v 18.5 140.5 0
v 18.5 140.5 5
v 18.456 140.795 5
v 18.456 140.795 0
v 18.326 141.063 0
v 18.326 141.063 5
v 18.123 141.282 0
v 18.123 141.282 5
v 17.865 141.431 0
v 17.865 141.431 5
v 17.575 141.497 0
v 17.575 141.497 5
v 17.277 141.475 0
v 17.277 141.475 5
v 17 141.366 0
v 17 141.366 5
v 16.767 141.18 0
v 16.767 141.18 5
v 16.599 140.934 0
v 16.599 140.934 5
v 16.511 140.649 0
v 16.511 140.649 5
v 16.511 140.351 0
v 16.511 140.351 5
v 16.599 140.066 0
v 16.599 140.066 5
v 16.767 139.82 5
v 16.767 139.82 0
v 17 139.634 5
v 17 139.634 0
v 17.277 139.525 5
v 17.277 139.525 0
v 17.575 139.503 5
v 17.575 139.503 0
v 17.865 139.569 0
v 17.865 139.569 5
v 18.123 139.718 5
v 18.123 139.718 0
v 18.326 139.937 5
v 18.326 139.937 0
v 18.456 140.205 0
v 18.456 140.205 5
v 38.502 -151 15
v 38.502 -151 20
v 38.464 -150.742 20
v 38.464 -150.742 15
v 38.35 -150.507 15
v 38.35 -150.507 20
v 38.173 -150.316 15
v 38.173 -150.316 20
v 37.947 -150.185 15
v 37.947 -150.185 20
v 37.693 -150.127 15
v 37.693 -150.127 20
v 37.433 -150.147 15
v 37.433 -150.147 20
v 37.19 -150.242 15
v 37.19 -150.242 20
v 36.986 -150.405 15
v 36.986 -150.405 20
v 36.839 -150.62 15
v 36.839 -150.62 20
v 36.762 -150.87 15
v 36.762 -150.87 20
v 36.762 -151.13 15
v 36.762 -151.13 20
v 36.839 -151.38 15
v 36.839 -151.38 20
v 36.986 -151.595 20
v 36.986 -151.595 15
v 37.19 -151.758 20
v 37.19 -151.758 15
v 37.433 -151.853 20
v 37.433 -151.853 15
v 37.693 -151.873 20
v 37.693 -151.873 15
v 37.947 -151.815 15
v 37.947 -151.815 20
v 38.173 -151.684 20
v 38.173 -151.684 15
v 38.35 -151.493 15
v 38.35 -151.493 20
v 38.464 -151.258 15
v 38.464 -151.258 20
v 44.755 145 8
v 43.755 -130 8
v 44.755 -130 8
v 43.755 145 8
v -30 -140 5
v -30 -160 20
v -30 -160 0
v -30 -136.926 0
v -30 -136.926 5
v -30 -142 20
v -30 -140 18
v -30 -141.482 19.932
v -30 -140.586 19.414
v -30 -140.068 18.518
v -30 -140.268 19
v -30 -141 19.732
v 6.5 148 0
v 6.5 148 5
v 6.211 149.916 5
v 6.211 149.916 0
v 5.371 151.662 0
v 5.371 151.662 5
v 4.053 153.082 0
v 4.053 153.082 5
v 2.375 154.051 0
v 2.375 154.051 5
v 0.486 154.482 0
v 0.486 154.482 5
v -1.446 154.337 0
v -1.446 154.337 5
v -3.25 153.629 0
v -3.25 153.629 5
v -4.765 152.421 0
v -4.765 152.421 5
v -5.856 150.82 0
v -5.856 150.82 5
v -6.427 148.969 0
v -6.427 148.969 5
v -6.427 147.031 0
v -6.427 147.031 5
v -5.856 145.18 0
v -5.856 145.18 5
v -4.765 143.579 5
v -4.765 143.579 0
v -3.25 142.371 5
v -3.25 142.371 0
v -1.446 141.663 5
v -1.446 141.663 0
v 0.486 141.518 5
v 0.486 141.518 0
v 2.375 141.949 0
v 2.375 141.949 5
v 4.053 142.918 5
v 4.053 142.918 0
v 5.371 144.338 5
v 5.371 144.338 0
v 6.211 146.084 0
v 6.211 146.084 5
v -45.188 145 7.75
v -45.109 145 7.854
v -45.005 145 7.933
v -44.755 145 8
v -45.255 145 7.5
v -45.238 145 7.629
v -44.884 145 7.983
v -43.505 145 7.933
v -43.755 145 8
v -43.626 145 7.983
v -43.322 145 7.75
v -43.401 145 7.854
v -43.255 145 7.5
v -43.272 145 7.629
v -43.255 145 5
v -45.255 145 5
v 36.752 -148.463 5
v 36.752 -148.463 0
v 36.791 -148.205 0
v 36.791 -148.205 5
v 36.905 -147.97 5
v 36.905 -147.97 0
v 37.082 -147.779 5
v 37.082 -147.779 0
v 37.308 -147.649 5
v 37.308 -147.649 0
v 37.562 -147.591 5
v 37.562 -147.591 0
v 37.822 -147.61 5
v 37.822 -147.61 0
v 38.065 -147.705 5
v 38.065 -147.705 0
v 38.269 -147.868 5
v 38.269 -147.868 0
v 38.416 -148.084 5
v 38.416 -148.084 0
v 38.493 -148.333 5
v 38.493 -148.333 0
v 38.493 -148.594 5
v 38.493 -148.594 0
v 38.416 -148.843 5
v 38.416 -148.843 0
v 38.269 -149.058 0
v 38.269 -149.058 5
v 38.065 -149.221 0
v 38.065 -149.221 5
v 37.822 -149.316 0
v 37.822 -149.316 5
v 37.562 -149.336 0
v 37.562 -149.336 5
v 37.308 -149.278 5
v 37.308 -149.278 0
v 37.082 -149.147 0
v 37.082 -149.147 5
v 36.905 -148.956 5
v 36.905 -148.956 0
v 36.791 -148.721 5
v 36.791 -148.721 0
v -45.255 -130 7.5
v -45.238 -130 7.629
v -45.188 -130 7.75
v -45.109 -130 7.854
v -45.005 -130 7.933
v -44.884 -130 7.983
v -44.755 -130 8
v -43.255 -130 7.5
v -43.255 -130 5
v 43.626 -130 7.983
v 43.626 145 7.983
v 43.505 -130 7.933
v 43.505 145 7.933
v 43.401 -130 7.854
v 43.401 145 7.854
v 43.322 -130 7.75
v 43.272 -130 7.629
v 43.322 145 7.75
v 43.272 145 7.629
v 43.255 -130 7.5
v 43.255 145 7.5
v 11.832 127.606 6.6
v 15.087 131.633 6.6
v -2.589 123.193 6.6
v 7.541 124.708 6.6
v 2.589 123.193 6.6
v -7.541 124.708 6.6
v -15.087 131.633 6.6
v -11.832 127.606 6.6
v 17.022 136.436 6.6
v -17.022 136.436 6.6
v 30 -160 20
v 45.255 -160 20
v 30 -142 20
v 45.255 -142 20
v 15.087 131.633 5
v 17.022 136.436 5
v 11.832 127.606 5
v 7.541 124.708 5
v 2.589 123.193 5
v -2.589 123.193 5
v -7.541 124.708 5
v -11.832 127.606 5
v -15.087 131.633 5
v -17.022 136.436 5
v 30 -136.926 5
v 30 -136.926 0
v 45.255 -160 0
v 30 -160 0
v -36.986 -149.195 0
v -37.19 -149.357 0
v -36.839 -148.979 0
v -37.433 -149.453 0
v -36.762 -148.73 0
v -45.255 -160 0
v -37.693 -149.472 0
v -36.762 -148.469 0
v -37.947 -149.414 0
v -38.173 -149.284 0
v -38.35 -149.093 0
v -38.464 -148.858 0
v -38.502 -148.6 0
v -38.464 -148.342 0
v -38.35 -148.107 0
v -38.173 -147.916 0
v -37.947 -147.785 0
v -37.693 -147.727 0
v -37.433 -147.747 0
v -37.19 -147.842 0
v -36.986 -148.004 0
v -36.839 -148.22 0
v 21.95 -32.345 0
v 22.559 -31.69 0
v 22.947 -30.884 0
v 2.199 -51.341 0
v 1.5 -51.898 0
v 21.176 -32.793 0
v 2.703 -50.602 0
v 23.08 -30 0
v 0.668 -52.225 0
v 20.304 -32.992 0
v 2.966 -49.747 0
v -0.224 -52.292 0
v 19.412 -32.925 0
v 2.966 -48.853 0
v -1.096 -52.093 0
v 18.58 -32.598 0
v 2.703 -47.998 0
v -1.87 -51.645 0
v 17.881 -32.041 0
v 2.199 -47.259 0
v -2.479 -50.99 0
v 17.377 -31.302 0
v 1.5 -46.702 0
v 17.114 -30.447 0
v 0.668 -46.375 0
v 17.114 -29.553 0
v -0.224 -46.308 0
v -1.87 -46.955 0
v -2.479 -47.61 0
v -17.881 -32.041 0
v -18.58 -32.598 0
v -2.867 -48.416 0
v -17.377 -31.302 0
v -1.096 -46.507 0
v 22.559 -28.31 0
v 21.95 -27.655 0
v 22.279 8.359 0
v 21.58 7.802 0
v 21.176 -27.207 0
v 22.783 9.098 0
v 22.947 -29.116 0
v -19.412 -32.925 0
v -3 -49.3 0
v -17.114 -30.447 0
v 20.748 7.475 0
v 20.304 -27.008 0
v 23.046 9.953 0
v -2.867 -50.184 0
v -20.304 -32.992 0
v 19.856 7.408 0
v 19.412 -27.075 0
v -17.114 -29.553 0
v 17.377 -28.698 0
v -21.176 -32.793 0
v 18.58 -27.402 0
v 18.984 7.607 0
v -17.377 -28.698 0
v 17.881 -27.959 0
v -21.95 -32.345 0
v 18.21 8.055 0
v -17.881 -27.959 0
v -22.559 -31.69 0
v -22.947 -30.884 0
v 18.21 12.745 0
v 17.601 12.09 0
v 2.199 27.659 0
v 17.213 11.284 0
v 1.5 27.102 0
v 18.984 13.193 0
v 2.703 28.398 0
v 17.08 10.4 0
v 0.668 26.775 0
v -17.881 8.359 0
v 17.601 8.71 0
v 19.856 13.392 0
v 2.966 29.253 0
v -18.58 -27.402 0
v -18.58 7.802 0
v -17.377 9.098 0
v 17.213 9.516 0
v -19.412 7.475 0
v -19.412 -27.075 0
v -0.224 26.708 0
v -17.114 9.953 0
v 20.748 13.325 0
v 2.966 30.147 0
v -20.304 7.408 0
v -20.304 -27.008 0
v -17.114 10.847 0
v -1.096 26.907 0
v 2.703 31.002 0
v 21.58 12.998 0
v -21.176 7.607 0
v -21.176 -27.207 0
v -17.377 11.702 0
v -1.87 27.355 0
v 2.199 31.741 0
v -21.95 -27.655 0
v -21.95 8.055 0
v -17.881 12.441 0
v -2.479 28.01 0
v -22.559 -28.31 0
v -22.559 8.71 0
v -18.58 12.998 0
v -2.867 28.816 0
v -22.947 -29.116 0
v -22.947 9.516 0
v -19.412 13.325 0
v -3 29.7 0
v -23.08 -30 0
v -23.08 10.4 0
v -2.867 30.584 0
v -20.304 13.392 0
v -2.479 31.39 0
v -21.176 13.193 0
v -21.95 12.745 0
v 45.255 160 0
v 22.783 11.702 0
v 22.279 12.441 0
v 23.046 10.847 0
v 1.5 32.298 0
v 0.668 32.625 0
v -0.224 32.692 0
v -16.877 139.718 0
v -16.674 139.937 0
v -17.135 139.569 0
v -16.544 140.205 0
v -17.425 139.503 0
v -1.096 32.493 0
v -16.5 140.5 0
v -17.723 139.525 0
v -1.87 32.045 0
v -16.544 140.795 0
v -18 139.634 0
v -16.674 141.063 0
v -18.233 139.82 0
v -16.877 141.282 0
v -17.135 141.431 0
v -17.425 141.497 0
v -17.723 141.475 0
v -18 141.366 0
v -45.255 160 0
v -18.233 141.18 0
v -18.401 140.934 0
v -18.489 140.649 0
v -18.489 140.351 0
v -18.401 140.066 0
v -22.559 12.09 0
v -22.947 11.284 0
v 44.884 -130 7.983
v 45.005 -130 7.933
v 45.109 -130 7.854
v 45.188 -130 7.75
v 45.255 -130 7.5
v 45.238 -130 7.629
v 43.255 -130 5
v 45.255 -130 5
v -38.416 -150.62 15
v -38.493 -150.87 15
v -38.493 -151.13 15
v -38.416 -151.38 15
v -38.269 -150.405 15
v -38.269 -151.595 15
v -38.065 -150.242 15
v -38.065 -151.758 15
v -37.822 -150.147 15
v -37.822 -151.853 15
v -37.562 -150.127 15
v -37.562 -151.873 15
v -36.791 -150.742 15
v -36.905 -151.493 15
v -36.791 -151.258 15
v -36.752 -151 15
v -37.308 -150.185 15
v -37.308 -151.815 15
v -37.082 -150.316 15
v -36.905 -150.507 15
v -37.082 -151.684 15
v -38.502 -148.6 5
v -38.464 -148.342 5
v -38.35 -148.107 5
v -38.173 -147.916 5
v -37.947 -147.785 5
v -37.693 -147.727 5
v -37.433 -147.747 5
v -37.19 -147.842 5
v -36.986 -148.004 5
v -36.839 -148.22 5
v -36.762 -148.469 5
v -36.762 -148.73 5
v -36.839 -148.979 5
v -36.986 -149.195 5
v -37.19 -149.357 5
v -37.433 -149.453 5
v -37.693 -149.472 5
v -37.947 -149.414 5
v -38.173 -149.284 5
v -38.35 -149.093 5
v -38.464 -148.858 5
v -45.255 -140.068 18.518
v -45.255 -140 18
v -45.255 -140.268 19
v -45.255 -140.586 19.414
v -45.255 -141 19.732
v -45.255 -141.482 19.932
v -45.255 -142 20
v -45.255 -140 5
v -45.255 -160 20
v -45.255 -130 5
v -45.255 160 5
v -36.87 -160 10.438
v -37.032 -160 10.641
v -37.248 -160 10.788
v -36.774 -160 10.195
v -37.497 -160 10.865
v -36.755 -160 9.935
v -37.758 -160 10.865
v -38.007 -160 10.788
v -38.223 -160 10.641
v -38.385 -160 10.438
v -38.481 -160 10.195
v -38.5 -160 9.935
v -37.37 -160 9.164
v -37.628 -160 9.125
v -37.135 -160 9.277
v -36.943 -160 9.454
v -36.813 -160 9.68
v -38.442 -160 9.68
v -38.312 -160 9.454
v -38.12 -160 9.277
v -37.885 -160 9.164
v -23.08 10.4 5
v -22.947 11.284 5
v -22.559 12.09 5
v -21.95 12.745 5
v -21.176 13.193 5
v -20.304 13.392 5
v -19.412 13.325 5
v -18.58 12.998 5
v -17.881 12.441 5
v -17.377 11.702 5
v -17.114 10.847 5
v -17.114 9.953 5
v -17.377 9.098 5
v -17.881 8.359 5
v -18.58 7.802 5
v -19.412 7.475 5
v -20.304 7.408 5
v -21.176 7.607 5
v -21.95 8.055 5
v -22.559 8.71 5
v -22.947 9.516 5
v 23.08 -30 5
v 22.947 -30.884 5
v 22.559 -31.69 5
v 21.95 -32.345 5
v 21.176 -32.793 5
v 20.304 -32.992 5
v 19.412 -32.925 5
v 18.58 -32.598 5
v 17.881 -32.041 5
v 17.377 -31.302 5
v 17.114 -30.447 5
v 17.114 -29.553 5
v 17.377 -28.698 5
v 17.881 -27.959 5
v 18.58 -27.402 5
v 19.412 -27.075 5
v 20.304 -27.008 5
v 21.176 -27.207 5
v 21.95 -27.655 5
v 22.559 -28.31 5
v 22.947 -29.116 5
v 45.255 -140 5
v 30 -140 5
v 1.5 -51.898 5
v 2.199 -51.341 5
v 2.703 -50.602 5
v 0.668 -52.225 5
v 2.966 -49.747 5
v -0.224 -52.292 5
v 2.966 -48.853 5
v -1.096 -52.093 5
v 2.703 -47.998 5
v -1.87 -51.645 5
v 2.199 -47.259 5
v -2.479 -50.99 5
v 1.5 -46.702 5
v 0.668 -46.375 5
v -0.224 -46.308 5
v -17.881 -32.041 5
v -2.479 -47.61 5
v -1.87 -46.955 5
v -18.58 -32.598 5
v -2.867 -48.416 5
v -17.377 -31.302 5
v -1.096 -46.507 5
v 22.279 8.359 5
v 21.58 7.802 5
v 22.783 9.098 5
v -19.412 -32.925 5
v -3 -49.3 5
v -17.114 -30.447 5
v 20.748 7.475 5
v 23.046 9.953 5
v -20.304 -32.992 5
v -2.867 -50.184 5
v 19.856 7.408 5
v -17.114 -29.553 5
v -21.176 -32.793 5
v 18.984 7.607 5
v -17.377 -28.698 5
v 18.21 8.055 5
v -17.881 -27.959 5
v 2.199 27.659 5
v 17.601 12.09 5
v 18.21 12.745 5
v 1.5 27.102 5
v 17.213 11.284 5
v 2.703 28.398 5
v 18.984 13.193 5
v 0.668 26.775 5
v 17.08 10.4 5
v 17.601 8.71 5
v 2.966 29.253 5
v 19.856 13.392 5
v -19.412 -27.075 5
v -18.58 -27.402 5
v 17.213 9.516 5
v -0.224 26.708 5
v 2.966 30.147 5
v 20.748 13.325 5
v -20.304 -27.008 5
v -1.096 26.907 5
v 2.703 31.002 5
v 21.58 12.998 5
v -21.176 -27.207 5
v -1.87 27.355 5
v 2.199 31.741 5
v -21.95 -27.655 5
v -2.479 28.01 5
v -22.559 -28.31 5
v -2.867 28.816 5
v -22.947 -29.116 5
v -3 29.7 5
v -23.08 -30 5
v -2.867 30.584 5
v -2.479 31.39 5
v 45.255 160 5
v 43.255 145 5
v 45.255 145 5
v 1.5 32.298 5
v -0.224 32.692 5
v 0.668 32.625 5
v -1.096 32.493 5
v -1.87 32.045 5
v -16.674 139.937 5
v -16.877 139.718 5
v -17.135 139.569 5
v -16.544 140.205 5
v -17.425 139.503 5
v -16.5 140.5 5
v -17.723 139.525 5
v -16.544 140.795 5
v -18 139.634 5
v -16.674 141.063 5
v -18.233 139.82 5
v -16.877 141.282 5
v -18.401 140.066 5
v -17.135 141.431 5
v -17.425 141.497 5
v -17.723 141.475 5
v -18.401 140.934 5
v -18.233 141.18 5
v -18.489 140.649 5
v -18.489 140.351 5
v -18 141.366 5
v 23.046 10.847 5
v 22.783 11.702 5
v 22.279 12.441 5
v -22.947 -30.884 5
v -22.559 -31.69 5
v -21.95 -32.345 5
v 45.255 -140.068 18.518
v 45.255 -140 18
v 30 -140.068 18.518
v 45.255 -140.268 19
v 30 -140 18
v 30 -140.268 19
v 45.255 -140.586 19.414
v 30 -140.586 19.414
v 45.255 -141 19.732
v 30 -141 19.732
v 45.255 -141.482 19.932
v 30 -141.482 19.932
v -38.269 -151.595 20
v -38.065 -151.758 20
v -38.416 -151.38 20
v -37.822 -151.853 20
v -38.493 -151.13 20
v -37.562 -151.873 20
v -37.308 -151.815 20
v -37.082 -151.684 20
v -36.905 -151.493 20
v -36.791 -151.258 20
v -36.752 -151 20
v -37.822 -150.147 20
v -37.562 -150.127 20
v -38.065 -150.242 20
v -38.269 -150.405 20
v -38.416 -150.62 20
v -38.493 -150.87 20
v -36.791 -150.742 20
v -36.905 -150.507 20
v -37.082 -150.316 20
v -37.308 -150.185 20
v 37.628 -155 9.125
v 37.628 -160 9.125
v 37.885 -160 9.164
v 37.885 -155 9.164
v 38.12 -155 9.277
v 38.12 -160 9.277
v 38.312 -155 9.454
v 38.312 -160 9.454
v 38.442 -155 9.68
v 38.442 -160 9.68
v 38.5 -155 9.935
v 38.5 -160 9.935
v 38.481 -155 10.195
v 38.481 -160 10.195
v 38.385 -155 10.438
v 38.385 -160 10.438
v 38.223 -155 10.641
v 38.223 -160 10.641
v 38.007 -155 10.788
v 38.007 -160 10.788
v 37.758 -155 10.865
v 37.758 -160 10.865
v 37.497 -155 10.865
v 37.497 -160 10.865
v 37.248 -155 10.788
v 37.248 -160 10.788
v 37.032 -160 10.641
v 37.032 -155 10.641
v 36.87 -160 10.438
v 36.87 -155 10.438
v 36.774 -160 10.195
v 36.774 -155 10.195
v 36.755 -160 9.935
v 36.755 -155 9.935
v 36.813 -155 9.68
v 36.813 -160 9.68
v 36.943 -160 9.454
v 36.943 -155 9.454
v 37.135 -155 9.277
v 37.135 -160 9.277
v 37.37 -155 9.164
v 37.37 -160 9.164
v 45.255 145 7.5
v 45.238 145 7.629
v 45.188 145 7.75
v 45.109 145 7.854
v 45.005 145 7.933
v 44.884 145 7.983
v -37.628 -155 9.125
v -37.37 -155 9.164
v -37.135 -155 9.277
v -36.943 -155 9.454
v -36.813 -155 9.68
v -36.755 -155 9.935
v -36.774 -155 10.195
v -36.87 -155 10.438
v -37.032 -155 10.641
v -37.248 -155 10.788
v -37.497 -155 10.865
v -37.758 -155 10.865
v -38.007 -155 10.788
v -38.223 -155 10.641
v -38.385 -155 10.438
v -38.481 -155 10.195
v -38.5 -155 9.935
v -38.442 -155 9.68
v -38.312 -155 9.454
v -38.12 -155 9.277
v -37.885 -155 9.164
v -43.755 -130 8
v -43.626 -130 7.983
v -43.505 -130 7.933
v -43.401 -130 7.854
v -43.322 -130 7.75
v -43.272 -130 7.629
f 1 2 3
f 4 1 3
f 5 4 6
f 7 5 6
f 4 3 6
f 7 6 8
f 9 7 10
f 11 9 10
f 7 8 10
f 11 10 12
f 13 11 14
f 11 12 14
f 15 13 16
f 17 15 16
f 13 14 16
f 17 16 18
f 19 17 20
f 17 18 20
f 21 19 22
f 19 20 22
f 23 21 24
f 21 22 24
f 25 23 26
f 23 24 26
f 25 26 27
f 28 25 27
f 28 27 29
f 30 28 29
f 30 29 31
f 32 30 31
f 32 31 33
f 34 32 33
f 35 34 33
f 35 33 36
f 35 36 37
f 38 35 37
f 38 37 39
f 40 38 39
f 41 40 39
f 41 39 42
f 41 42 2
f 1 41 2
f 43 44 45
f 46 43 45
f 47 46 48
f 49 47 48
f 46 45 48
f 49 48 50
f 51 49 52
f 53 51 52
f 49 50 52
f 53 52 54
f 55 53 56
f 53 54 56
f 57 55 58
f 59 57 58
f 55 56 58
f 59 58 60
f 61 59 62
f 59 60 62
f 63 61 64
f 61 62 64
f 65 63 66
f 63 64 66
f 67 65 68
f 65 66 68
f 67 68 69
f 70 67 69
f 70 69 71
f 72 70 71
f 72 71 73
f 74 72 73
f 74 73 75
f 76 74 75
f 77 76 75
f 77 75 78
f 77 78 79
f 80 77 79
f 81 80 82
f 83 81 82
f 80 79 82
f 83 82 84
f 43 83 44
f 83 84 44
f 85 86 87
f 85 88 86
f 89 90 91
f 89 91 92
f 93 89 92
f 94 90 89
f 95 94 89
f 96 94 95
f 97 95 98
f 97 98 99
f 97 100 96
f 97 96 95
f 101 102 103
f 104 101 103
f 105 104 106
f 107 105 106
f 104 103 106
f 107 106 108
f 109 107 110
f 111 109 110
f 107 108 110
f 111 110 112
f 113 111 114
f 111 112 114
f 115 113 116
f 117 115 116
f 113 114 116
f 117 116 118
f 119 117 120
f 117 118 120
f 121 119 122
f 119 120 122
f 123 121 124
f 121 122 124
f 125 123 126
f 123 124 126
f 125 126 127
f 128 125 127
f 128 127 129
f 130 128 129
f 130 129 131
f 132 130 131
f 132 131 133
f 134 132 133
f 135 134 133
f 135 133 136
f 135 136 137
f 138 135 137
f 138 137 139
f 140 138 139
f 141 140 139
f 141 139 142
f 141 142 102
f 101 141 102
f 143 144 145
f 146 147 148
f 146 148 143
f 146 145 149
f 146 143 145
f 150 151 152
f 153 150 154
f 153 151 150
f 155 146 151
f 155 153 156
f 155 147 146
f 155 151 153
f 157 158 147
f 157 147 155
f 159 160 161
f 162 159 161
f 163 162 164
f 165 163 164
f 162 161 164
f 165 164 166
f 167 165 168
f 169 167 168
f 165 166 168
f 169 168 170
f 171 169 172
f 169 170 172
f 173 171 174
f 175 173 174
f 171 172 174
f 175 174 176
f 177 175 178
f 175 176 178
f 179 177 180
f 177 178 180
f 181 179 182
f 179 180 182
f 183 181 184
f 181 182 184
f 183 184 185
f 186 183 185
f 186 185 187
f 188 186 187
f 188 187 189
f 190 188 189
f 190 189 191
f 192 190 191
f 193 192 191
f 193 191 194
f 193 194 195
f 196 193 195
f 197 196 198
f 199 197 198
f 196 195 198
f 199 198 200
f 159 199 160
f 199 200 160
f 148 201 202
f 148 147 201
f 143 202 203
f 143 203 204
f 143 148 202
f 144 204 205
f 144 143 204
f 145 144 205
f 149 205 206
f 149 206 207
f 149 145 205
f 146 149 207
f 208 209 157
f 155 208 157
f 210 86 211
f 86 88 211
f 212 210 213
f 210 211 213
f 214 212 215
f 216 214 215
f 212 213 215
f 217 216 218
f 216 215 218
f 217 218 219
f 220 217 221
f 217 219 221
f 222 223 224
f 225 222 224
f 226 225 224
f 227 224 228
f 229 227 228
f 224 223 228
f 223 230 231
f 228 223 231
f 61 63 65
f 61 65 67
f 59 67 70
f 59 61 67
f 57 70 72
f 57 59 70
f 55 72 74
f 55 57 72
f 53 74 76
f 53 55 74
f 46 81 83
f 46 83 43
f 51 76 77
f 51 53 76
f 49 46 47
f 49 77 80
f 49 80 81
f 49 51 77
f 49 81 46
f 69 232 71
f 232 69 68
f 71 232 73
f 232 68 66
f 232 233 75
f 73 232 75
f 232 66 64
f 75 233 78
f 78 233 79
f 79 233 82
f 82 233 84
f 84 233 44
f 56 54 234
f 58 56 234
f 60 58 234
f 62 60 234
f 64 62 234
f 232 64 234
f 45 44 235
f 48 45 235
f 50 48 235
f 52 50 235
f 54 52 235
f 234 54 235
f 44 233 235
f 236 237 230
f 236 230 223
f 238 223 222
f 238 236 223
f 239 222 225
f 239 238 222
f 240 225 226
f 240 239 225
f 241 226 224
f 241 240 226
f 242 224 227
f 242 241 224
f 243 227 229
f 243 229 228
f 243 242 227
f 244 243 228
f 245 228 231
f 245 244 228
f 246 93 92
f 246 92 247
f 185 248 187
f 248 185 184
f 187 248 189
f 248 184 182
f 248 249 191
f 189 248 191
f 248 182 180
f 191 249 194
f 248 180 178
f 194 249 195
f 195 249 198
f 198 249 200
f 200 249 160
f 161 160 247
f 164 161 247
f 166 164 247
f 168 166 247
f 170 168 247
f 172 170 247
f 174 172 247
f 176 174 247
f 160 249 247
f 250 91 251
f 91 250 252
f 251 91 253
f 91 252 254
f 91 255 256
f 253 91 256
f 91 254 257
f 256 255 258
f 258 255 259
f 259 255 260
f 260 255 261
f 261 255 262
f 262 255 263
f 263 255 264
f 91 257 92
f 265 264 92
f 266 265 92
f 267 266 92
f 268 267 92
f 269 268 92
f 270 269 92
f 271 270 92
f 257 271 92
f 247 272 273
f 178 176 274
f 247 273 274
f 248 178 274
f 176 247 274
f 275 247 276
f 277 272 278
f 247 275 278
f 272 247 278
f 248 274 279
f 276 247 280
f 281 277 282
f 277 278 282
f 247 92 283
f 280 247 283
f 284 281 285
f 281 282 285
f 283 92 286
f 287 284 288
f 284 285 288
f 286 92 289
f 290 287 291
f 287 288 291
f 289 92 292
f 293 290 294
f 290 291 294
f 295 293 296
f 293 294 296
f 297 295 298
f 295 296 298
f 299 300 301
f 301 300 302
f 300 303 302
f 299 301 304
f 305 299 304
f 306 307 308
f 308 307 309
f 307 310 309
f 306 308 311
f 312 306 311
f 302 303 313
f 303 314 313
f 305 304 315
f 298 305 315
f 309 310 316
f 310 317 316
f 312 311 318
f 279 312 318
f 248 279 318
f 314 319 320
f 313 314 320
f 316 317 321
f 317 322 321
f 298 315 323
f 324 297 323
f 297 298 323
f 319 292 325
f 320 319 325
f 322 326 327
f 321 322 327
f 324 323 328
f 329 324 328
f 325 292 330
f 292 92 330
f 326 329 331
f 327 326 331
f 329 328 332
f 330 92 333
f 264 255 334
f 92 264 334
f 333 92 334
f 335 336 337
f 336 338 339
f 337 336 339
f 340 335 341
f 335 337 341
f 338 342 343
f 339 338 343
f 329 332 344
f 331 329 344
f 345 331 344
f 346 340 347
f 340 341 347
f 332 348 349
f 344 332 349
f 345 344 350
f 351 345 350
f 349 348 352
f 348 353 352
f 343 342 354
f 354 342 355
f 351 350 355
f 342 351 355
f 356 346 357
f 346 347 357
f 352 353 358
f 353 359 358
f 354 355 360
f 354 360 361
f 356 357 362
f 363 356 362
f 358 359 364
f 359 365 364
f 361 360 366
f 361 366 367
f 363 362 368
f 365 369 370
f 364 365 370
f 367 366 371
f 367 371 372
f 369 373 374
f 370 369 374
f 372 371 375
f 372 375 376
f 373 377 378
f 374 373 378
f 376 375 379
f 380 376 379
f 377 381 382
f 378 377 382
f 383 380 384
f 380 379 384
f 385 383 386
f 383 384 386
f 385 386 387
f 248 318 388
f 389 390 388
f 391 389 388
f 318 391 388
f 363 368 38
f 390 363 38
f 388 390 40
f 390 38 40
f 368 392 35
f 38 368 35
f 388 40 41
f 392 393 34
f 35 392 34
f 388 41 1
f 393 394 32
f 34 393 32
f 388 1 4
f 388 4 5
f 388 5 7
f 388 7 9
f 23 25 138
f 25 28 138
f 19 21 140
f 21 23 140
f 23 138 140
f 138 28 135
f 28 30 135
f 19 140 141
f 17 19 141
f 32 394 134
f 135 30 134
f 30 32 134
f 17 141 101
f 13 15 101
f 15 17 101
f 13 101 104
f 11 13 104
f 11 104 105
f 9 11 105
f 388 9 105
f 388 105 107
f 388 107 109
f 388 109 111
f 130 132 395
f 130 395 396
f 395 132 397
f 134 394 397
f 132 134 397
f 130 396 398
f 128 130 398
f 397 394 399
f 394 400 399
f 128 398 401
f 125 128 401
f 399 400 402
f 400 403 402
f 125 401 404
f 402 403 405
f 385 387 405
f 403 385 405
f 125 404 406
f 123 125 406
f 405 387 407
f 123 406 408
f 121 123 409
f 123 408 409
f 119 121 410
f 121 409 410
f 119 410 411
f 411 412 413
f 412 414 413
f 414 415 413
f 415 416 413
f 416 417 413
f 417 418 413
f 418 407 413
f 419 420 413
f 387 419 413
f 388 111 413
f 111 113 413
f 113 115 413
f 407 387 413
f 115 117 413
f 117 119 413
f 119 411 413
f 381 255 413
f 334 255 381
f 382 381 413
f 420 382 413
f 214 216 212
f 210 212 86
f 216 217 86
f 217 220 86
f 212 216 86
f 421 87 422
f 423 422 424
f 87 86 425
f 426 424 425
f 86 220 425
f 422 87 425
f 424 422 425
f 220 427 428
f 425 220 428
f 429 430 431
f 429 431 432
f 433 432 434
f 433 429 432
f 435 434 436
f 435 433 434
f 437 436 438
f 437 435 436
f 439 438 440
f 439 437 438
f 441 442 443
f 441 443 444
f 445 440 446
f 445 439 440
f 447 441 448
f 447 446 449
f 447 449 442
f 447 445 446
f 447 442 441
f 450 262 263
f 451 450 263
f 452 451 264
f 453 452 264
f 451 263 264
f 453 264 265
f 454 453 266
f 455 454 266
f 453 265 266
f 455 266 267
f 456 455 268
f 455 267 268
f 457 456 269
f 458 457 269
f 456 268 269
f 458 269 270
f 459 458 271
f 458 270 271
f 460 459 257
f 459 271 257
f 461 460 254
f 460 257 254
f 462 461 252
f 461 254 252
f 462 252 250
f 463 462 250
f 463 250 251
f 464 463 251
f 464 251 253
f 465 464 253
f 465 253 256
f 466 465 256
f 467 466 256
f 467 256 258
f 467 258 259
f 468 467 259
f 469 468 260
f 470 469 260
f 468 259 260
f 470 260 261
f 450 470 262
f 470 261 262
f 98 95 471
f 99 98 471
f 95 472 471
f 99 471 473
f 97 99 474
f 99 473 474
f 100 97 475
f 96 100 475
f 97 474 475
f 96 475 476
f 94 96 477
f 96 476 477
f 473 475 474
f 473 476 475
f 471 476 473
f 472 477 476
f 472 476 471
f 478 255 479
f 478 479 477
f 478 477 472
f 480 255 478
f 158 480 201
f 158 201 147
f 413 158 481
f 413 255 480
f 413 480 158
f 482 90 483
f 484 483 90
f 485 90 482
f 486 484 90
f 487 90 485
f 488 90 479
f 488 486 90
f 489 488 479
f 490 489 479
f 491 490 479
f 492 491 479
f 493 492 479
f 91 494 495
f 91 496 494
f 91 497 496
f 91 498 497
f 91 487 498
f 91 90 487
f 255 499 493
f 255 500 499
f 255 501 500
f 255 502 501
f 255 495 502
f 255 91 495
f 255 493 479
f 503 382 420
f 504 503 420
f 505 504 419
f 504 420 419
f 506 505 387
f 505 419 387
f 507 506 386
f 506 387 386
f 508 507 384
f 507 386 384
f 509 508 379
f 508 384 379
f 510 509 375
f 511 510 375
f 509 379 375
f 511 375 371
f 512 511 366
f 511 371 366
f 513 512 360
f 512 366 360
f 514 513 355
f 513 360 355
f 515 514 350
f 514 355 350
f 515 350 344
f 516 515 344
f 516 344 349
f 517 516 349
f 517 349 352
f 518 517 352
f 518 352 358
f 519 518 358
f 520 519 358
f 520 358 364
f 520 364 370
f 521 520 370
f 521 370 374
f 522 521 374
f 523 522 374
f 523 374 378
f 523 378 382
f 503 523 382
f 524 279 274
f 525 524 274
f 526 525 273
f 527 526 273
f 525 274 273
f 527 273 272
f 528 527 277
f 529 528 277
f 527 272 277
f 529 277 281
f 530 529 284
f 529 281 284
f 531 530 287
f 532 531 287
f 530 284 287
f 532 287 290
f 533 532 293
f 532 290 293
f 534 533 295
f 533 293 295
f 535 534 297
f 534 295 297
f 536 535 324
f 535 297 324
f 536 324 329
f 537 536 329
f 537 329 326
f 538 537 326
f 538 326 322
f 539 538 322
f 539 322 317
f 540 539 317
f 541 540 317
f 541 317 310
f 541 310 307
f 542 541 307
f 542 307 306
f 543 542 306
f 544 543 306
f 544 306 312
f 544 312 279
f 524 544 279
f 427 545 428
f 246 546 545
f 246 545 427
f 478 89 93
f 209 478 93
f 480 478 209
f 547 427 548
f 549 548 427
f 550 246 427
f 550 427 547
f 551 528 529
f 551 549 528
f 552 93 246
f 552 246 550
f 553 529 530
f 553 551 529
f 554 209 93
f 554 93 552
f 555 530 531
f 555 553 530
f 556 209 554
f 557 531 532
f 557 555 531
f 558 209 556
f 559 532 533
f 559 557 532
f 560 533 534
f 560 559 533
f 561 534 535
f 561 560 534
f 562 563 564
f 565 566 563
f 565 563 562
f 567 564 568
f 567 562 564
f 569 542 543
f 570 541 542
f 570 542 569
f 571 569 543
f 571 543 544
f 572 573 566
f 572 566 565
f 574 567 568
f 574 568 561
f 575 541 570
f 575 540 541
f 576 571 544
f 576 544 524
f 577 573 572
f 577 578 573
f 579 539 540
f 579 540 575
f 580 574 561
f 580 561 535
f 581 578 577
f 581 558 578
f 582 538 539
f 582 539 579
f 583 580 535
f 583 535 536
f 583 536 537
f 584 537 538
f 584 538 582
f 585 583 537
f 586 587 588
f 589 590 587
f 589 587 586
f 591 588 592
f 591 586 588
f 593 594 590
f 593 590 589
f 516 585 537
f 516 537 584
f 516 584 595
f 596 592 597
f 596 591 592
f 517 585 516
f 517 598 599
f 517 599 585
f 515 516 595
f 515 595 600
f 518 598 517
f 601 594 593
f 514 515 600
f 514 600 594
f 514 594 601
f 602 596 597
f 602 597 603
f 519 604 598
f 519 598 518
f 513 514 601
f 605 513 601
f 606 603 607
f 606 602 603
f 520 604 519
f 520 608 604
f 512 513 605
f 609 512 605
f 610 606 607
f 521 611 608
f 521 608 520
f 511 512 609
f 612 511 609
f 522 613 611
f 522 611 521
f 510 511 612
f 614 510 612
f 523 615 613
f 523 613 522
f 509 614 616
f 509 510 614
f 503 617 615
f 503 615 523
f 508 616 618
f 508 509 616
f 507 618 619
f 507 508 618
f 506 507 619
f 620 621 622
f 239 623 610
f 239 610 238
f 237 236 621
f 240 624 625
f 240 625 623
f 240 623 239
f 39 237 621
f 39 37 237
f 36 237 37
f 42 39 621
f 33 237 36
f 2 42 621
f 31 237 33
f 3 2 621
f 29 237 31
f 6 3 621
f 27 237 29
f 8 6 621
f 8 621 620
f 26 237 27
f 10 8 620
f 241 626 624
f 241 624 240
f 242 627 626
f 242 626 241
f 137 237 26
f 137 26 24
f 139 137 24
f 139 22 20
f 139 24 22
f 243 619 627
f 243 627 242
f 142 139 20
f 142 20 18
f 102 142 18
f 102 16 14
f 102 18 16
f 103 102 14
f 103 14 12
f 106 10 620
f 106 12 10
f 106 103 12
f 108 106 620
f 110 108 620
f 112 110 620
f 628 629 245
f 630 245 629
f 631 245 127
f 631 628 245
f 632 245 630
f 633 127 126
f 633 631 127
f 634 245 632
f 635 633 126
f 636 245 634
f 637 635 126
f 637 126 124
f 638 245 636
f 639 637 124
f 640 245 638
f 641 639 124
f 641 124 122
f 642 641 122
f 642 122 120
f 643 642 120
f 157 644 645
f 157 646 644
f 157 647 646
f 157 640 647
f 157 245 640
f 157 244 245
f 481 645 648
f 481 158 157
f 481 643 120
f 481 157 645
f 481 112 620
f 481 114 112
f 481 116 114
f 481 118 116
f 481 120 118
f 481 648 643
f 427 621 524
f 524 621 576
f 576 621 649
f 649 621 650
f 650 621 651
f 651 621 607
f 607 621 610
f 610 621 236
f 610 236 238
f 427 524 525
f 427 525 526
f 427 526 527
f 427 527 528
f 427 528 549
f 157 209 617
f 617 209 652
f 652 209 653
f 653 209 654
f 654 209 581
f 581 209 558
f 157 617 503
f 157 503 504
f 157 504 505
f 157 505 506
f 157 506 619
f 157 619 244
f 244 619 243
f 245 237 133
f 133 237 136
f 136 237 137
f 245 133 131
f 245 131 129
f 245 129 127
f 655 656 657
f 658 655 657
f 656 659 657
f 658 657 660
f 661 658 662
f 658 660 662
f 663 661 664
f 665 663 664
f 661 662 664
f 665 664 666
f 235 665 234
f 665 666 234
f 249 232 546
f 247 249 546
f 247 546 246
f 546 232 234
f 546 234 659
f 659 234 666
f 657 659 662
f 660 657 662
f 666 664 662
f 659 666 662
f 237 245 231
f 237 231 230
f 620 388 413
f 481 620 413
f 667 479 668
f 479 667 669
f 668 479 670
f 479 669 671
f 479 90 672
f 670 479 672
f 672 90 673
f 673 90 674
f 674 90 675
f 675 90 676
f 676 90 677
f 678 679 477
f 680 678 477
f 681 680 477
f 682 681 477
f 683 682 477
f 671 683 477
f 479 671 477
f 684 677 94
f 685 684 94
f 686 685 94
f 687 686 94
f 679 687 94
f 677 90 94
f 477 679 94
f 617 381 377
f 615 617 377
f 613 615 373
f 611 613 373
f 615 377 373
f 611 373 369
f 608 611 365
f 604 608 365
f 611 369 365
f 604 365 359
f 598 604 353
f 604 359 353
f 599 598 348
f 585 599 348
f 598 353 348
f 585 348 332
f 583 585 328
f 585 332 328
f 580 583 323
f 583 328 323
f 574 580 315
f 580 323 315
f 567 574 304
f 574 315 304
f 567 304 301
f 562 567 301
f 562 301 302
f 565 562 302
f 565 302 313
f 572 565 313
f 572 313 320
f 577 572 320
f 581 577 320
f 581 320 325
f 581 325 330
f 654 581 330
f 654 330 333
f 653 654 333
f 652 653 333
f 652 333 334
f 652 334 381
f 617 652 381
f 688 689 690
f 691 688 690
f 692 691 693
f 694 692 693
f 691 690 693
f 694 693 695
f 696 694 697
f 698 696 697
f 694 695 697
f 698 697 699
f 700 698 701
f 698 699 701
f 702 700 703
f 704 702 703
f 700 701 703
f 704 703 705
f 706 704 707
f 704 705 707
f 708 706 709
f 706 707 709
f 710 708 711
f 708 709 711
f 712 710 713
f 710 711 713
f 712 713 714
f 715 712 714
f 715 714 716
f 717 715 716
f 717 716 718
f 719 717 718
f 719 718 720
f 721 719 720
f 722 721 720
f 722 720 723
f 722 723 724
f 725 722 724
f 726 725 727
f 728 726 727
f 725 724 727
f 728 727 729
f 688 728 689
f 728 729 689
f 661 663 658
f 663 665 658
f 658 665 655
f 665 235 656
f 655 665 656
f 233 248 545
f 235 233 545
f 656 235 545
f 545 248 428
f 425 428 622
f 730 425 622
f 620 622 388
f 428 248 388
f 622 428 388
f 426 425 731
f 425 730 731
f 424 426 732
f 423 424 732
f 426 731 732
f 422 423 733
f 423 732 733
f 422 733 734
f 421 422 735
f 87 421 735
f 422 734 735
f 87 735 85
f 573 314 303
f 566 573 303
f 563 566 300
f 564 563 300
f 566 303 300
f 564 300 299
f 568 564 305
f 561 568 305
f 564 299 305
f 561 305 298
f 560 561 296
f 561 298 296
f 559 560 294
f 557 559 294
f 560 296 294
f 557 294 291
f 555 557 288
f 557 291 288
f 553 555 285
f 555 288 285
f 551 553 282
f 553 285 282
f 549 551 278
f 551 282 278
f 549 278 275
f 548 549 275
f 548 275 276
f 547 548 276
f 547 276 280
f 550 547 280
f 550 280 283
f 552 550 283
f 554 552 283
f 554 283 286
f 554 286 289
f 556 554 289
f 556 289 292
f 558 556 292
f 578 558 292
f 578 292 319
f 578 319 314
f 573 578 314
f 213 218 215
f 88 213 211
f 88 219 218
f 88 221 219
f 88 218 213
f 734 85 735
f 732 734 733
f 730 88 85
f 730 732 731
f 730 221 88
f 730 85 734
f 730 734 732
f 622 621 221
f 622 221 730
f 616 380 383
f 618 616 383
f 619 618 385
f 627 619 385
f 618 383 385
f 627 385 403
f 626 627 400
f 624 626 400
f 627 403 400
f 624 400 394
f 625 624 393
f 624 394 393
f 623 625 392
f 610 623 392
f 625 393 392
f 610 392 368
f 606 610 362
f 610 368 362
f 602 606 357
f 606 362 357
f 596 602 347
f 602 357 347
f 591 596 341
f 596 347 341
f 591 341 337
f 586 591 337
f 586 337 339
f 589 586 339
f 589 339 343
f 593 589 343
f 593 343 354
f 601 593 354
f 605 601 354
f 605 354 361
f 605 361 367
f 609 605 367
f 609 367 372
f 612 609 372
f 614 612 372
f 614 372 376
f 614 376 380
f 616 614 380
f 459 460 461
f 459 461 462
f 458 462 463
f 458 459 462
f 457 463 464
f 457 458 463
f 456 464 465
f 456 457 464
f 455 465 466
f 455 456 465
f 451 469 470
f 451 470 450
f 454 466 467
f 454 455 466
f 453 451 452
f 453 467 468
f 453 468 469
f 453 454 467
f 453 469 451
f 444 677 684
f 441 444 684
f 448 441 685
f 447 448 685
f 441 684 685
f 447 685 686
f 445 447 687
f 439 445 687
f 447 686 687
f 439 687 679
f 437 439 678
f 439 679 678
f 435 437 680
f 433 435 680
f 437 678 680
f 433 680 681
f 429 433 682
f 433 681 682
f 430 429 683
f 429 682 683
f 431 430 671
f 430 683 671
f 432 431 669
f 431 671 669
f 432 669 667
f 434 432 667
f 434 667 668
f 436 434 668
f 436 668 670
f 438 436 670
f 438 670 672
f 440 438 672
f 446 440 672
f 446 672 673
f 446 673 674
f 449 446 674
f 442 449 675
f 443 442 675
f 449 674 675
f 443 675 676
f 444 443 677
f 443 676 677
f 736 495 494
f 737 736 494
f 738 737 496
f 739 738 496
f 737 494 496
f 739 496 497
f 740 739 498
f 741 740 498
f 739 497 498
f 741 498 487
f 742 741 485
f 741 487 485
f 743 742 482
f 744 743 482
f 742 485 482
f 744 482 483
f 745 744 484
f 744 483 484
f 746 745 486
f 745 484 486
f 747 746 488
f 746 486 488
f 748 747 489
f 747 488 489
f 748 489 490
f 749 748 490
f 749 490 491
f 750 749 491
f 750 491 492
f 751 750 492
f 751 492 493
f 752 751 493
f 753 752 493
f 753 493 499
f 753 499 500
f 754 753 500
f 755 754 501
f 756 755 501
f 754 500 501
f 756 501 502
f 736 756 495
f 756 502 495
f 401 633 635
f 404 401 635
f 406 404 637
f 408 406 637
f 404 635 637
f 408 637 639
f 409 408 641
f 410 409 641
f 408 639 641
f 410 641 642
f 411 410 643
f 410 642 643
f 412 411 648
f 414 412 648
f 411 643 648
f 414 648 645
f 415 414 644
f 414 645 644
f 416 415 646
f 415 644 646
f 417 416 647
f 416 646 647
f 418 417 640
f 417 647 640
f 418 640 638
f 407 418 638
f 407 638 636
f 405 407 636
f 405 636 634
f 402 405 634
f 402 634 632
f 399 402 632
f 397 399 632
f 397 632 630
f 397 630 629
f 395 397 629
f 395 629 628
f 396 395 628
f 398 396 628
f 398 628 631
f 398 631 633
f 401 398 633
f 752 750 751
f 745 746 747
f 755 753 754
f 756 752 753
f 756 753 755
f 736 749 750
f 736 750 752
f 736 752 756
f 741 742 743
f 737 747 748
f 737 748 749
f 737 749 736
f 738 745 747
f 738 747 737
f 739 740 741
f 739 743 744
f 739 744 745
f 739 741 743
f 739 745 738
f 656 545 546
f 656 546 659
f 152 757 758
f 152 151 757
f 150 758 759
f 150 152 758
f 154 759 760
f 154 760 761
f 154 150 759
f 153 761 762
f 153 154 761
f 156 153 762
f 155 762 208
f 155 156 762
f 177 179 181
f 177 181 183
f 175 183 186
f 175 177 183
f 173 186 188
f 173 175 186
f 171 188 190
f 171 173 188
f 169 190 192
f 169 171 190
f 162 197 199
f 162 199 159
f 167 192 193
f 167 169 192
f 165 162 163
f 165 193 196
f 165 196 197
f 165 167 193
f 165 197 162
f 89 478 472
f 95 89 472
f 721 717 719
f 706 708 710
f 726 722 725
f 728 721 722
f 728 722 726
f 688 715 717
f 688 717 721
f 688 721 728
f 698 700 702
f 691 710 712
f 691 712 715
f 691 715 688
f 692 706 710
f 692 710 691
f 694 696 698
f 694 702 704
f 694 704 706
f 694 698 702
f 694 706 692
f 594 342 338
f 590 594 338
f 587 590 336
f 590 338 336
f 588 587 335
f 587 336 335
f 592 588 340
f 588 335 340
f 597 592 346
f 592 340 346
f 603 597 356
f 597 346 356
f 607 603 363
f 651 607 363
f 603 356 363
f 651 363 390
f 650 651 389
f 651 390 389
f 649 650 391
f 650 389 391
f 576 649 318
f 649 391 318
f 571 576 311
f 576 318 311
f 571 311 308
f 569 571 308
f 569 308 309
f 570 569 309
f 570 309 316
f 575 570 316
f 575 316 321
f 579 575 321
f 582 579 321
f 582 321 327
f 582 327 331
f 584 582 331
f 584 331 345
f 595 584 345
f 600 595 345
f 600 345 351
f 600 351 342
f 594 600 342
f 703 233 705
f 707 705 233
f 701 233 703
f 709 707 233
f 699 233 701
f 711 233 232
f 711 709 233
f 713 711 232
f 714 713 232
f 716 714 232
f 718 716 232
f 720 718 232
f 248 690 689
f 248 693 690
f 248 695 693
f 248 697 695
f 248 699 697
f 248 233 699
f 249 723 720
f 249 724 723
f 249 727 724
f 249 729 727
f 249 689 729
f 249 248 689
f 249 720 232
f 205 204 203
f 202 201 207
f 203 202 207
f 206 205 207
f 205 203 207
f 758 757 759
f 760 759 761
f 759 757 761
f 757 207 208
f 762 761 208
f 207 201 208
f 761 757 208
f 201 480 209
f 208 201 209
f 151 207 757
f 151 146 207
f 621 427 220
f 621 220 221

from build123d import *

# Parameters (mm, degrees)
SKETCH1_W                    = 320
SKETCH1_H                    = 90.51
CHASSIS_BASE_DEPTH           = 5
SKETCH3_W                    = 2
SKETCH3_H                    = 275
LATERAL_GUARD_DEPTH          = 3
DRIVE_ATTACHMENT_POINT_REACH = 168.469
SKETCH4_R                    = 3
CUT_EXTRUDE2_REACH           = 168.352
SKETCH5_R                    = 6.5
SKETCH5_R_2                  = 1
SKETCH6_W                    = 20
SKETCH6_H                    = 20
BOSS_EXTRUDE1_DEPTH          = 90.51
CUT_EXTRUDE3_REACH           = 169.475
SKETCH7_W                    = 60
SKETCH7_H                    = 23.073600821
FILLET3_R                    = 0.5
FILLET4_R                    = 2
SKETCH9_R                    = 0.875
CUT_EXTRUDE5_DEPTH           = 5
SKETCH10_R                   = 0.875
CUT_EXTRUDE6_DEPTH           = 5
SKETCH11_R                   = 0.875
CUT_EXTRUDE7_DEPTH           = 5
SKETCH12_R                   = 0.875
CUT_EXTRUDE8_DEPTH           = 5
SKETCH13_R                   = 0.875
CUT_EXTRUDE9_DEPTH           = 5
SKETCH14_R                   = 0.875
CUT_EXTRUDE10_DEPTH          = 5
BOSS_EXTRUDE2_DEPTH          = 1.6


with BuildPart() as part:
    # Sketch1 → Chassis Base (new body)
    with BuildSketch(Plane(origin=(0, 0, 0), x_dir=(0, 1, 0), z_dir=(0, 0, 1))):
        Rectangle(SKETCH1_W, SKETCH1_H)
    extrude(amount=CHASSIS_BASE_DEPTH)

    # Sketch3 → Lateral Guard (add)
    with BuildSketch(Plane.XY.offset(5)):
        with Locations((-44.255, 7.5)):
            Rectangle(SKETCH3_W, SKETCH3_H)
        with Locations((44.255, 7.5)):
            Rectangle(SKETCH3_W, SKETCH3_H)
    extrude(amount=LATERAL_GUARD_DEPTH)

    # Sketch4 → Drive Attachment Point (cut, up to next)
    with BuildSketch(Plane(origin=(0, 0, 0), x_dir=(1, 0, 0), z_dir=(0, 0, -1)), mode=Mode.PRIVATE) as drive_attachment_point_sk1:
        with Locations(Location((0, -29.7, 0), (0, 0, 180))):
            Circle(SKETCH4_R)
    drive_attachment_point_tool1 = extrude(drive_attachment_point_sk1.sketch, amount=-DRIVE_ATTACHMENT_POINT_REACH, mode=Mode.PRIVATE) & part.part
    # Sketch4 → Drive Attachment Point (cut, up to next)
    with BuildSketch(Plane(origin=(0, 0, 0), x_dir=(1, 0, 0), z_dir=(0, 0, -1)), mode=Mode.PRIVATE) as drive_attachment_point_sk2:
        with Locations(Location((-20.08, 30, 0), (0, 0, 180))):
            Circle(SKETCH4_R)
    drive_attachment_point_tool2 = extrude(drive_attachment_point_sk2.sketch, amount=-DRIVE_ATTACHMENT_POINT_REACH, mode=Mode.PRIVATE) & part.part
    # Sketch4 → Drive Attachment Point (cut, up to next)
    with BuildSketch(Plane(origin=(0, 0, 0), x_dir=(1, 0, 0), z_dir=(0, 0, -1)), mode=Mode.PRIVATE) as drive_attachment_point_sk3:
        with Locations((20.08, 30)):
            Circle(SKETCH4_R)
    drive_attachment_point_tool3 = extrude(drive_attachment_point_sk3.sketch, amount=-DRIVE_ATTACHMENT_POINT_REACH, mode=Mode.PRIVATE) & part.part
    # Sketch4 → Drive Attachment Point (cut, up to next)
    with BuildSketch(Plane(origin=(0, 0, 0), x_dir=(1, 0, 0), z_dir=(0, 0, -1)), mode=Mode.PRIVATE) as drive_attachment_point_sk4:
        with Locations(Location((0, 49.3, 0), (0, 0, 180))):
            Circle(SKETCH4_R)
    drive_attachment_point_tool4 = extrude(drive_attachment_point_sk4.sketch, amount=-DRIVE_ATTACHMENT_POINT_REACH, mode=Mode.PRIVATE) & part.part
    # Sketch4 → Drive Attachment Point (cut, up to next)
    with BuildSketch(Plane(origin=(0, 0, 0), x_dir=(1, 0, 0), z_dir=(0, 0, -1)), mode=Mode.PRIVATE) as drive_attachment_point_sk5:
        with Locations(Location((-20.08, -10.4, 0), (0, 0, 180))):
            Circle(SKETCH4_R)
    drive_attachment_point_tool5 = extrude(drive_attachment_point_sk5.sketch, amount=-DRIVE_ATTACHMENT_POINT_REACH, mode=Mode.PRIVATE) & part.part
    # Sketch4 → Drive Attachment Point (cut, up to next)
    with BuildSketch(Plane(origin=(0, 0, 0), x_dir=(1, 0, 0), z_dir=(0, 0, -1)), mode=Mode.PRIVATE) as drive_attachment_point_sk6:
        with Locations(Location((20.08, -10.4, 0), (0, 0, 180))):
            Circle(SKETCH4_R)
    drive_attachment_point_tool6 = extrude(drive_attachment_point_sk6.sketch, amount=-DRIVE_ATTACHMENT_POINT_REACH, mode=Mode.PRIVATE) & part.part
    add(drive_attachment_point_tool1.solids().sort_by_distance((0, 29.7, 0))[0], mode=Mode.SUBTRACT)
    add(drive_attachment_point_tool2.solids().sort_by_distance((-20.08, -30, 0))[0], mode=Mode.SUBTRACT)
    add(drive_attachment_point_tool3.solids().sort_by_distance((20.08, -30, 0))[0], mode=Mode.SUBTRACT)
    add(drive_attachment_point_tool4.solids().sort_by_distance((0, -49.3, 0))[0], mode=Mode.SUBTRACT)
    add(drive_attachment_point_tool5.solids().sort_by_distance((-20.08, 10.4, 0))[0], mode=Mode.SUBTRACT)
    add(drive_attachment_point_tool6.solids().sort_by_distance((20.08, 10.4, 0))[0], mode=Mode.SUBTRACT)

    # Sketch5 → Cut-Extrude2 (cut, up to next)
    with BuildSketch(Plane.XY.offset(5), mode=Mode.PRIVATE) as cut_extrude2_sk1:
        with Locations((0, 148)):
            Circle(SKETCH5_R)
    cut_extrude2_tool1 = extrude(cut_extrude2_sk1.sketch, amount=-CUT_EXTRUDE2_REACH, mode=Mode.PRIVATE) & part.part
    # Sketch5 → Cut-Extrude2 (cut, up to next)
    with BuildSketch(Plane.XY.offset(5), mode=Mode.PRIVATE) as cut_extrude2_sk2:
        with Locations((-17.5, 140.5)):
            Circle(SKETCH5_R_2)
    cut_extrude2_tool2 = extrude(cut_extrude2_sk2.sketch, amount=-CUT_EXTRUDE2_REACH, mode=Mode.PRIVATE) & part.part
    # Sketch5 → Cut-Extrude2 (cut, up to next)
    with BuildSketch(Plane.XY.offset(5), mode=Mode.PRIVATE) as cut_extrude2_sk3:
        with Locations((17.5, 140.5)):
            Circle(SKETCH5_R_2)
    cut_extrude2_tool3 = extrude(cut_extrude2_sk3.sketch, amount=-CUT_EXTRUDE2_REACH, mode=Mode.PRIVATE) & part.part
    add(cut_extrude2_tool1.solids().sort_by_distance((0, 148, 5))[0], mode=Mode.SUBTRACT)
    add(cut_extrude2_tool2.solids().sort_by_distance((-17.5, 140.5, 5))[0], mode=Mode.SUBTRACT)
    add(cut_extrude2_tool3.solids().sort_by_distance((17.5, 140.5, 5))[0], mode=Mode.SUBTRACT)

    # Sketch6 → Boss-Extrude1 (add)
    with BuildSketch(Plane.YZ.offset(45.255)):
        with Locations((-150, 10)):
            Rectangle(SKETCH6_W, SKETCH6_H)
    extrude(amount=-BOSS_EXTRUDE1_DEPTH)

    # Sketch7 → Cut-Extrude3 (cut, up to next)
    with BuildSketch(Plane.XY.offset(20), mode=Mode.PRIVATE) as cut_extrude3_sk1:
        with Locations((0, -148.463199589)):
            Rectangle(SKETCH7_W, SKETCH7_H)
    cut_extrude3_tool1 = extrude(cut_extrude3_sk1.sketch, amount=-CUT_EXTRUDE3_REACH, mode=Mode.PRIVATE) & part.part
    add(cut_extrude3_tool1.solids().sort_by_distance((0, -148.4632, 20))[0], mode=Mode.SUBTRACT)

    # Fillet3
    fillet3_edges = [part.edges().sort_by_distance(p)[0] for p in [
        (-45.255, 7.5, 8),
        (-43.255, 7.5, 8),
        (45.255, 7.5, 8),
        (43.255, 7.5, 8),
    ]]
    fillet(fillet3_edges, radius=FILLET3_R)

    # Fillet4
    fillet4_edges = [part.edges().sort_by_distance(p)[0] for p in [
        (37.6275, -140, 20),
        (-37.6275, -140, 20),
    ]]
    fillet(fillet4_edges, radius=FILLET4_R)

    # Sketch9 → Cut-Extrude5 (cut)
    with BuildSketch(Plane.XY.offset(20)):
        with Locations((-37.6275, -151)):
            Circle(SKETCH9_R)
    extrude(amount=-CUT_EXTRUDE5_DEPTH, mode=Mode.SUBTRACT)

    # Sketch10 → Cut-Extrude6 (cut)
    with BuildSketch(Plane.XZ.offset(160)):
        with Locations(Location((-37.6275, 10, 0), (0, 0, 270))):
            Circle(SKETCH10_R)
    extrude(amount=-CUT_EXTRUDE6_DEPTH, mode=Mode.SUBTRACT)

    # Sketch11 → Cut-Extrude7 (cut)
    with BuildSketch(Plane(origin=(0, 0, 0), x_dir=(1, 0, 0), z_dir=(0, 0, -1))):
        with Locations(Location((-37.6275, 148.599605515, 0), (0, 0, 180))):
            Circle(SKETCH11_R)
    extrude(amount=-CUT_EXTRUDE7_DEPTH, mode=Mode.SUBTRACT)

    # Sketch12 → Cut-Extrude8 (cut)
    with BuildSketch(Plane(origin=(0, 0, 0), x_dir=(1, 0, 0), z_dir=(0, 0, -1))):
        with Locations(Location((37.6275, 148.463199589, 0), (0, 0, 180))):
            Circle(SKETCH12_R)
    extrude(amount=-CUT_EXTRUDE8_DEPTH, mode=Mode.SUBTRACT)

    # Sketch13 → Cut-Extrude9 (cut)
    with BuildSketch(Plane.XZ.offset(160)):
        with Locations(Location((37.6275, 10, 0), (0, 0, 270))):
            Circle(SKETCH13_R)
    extrude(amount=-CUT_EXTRUDE9_DEPTH, mode=Mode.SUBTRACT)

    # Sketch14 → Cut-Extrude10 (cut)
    with BuildSketch(Plane.XY.offset(20)):
        with Locations((37.6275, -151)):
            Circle(SKETCH14_R)
    extrude(amount=-CUT_EXTRUDE10_DEPTH, mode=Mode.SUBTRACT)

    # Sketch15 → Boss-Extrude2 (add)
    with BuildSketch(Plane.XY.offset(5)):
        with BuildLine():
            Line((-17.021586315, 136.436061109), (17.021586315, 136.436061109))
            ThreePointArc((17.021586315, 136.436061109), (0, 123), (-17.021586315, 136.436061109))
        make_face()
    extrude(amount=BOSS_EXTRUDE2_DEPTH)


solid = part.part
